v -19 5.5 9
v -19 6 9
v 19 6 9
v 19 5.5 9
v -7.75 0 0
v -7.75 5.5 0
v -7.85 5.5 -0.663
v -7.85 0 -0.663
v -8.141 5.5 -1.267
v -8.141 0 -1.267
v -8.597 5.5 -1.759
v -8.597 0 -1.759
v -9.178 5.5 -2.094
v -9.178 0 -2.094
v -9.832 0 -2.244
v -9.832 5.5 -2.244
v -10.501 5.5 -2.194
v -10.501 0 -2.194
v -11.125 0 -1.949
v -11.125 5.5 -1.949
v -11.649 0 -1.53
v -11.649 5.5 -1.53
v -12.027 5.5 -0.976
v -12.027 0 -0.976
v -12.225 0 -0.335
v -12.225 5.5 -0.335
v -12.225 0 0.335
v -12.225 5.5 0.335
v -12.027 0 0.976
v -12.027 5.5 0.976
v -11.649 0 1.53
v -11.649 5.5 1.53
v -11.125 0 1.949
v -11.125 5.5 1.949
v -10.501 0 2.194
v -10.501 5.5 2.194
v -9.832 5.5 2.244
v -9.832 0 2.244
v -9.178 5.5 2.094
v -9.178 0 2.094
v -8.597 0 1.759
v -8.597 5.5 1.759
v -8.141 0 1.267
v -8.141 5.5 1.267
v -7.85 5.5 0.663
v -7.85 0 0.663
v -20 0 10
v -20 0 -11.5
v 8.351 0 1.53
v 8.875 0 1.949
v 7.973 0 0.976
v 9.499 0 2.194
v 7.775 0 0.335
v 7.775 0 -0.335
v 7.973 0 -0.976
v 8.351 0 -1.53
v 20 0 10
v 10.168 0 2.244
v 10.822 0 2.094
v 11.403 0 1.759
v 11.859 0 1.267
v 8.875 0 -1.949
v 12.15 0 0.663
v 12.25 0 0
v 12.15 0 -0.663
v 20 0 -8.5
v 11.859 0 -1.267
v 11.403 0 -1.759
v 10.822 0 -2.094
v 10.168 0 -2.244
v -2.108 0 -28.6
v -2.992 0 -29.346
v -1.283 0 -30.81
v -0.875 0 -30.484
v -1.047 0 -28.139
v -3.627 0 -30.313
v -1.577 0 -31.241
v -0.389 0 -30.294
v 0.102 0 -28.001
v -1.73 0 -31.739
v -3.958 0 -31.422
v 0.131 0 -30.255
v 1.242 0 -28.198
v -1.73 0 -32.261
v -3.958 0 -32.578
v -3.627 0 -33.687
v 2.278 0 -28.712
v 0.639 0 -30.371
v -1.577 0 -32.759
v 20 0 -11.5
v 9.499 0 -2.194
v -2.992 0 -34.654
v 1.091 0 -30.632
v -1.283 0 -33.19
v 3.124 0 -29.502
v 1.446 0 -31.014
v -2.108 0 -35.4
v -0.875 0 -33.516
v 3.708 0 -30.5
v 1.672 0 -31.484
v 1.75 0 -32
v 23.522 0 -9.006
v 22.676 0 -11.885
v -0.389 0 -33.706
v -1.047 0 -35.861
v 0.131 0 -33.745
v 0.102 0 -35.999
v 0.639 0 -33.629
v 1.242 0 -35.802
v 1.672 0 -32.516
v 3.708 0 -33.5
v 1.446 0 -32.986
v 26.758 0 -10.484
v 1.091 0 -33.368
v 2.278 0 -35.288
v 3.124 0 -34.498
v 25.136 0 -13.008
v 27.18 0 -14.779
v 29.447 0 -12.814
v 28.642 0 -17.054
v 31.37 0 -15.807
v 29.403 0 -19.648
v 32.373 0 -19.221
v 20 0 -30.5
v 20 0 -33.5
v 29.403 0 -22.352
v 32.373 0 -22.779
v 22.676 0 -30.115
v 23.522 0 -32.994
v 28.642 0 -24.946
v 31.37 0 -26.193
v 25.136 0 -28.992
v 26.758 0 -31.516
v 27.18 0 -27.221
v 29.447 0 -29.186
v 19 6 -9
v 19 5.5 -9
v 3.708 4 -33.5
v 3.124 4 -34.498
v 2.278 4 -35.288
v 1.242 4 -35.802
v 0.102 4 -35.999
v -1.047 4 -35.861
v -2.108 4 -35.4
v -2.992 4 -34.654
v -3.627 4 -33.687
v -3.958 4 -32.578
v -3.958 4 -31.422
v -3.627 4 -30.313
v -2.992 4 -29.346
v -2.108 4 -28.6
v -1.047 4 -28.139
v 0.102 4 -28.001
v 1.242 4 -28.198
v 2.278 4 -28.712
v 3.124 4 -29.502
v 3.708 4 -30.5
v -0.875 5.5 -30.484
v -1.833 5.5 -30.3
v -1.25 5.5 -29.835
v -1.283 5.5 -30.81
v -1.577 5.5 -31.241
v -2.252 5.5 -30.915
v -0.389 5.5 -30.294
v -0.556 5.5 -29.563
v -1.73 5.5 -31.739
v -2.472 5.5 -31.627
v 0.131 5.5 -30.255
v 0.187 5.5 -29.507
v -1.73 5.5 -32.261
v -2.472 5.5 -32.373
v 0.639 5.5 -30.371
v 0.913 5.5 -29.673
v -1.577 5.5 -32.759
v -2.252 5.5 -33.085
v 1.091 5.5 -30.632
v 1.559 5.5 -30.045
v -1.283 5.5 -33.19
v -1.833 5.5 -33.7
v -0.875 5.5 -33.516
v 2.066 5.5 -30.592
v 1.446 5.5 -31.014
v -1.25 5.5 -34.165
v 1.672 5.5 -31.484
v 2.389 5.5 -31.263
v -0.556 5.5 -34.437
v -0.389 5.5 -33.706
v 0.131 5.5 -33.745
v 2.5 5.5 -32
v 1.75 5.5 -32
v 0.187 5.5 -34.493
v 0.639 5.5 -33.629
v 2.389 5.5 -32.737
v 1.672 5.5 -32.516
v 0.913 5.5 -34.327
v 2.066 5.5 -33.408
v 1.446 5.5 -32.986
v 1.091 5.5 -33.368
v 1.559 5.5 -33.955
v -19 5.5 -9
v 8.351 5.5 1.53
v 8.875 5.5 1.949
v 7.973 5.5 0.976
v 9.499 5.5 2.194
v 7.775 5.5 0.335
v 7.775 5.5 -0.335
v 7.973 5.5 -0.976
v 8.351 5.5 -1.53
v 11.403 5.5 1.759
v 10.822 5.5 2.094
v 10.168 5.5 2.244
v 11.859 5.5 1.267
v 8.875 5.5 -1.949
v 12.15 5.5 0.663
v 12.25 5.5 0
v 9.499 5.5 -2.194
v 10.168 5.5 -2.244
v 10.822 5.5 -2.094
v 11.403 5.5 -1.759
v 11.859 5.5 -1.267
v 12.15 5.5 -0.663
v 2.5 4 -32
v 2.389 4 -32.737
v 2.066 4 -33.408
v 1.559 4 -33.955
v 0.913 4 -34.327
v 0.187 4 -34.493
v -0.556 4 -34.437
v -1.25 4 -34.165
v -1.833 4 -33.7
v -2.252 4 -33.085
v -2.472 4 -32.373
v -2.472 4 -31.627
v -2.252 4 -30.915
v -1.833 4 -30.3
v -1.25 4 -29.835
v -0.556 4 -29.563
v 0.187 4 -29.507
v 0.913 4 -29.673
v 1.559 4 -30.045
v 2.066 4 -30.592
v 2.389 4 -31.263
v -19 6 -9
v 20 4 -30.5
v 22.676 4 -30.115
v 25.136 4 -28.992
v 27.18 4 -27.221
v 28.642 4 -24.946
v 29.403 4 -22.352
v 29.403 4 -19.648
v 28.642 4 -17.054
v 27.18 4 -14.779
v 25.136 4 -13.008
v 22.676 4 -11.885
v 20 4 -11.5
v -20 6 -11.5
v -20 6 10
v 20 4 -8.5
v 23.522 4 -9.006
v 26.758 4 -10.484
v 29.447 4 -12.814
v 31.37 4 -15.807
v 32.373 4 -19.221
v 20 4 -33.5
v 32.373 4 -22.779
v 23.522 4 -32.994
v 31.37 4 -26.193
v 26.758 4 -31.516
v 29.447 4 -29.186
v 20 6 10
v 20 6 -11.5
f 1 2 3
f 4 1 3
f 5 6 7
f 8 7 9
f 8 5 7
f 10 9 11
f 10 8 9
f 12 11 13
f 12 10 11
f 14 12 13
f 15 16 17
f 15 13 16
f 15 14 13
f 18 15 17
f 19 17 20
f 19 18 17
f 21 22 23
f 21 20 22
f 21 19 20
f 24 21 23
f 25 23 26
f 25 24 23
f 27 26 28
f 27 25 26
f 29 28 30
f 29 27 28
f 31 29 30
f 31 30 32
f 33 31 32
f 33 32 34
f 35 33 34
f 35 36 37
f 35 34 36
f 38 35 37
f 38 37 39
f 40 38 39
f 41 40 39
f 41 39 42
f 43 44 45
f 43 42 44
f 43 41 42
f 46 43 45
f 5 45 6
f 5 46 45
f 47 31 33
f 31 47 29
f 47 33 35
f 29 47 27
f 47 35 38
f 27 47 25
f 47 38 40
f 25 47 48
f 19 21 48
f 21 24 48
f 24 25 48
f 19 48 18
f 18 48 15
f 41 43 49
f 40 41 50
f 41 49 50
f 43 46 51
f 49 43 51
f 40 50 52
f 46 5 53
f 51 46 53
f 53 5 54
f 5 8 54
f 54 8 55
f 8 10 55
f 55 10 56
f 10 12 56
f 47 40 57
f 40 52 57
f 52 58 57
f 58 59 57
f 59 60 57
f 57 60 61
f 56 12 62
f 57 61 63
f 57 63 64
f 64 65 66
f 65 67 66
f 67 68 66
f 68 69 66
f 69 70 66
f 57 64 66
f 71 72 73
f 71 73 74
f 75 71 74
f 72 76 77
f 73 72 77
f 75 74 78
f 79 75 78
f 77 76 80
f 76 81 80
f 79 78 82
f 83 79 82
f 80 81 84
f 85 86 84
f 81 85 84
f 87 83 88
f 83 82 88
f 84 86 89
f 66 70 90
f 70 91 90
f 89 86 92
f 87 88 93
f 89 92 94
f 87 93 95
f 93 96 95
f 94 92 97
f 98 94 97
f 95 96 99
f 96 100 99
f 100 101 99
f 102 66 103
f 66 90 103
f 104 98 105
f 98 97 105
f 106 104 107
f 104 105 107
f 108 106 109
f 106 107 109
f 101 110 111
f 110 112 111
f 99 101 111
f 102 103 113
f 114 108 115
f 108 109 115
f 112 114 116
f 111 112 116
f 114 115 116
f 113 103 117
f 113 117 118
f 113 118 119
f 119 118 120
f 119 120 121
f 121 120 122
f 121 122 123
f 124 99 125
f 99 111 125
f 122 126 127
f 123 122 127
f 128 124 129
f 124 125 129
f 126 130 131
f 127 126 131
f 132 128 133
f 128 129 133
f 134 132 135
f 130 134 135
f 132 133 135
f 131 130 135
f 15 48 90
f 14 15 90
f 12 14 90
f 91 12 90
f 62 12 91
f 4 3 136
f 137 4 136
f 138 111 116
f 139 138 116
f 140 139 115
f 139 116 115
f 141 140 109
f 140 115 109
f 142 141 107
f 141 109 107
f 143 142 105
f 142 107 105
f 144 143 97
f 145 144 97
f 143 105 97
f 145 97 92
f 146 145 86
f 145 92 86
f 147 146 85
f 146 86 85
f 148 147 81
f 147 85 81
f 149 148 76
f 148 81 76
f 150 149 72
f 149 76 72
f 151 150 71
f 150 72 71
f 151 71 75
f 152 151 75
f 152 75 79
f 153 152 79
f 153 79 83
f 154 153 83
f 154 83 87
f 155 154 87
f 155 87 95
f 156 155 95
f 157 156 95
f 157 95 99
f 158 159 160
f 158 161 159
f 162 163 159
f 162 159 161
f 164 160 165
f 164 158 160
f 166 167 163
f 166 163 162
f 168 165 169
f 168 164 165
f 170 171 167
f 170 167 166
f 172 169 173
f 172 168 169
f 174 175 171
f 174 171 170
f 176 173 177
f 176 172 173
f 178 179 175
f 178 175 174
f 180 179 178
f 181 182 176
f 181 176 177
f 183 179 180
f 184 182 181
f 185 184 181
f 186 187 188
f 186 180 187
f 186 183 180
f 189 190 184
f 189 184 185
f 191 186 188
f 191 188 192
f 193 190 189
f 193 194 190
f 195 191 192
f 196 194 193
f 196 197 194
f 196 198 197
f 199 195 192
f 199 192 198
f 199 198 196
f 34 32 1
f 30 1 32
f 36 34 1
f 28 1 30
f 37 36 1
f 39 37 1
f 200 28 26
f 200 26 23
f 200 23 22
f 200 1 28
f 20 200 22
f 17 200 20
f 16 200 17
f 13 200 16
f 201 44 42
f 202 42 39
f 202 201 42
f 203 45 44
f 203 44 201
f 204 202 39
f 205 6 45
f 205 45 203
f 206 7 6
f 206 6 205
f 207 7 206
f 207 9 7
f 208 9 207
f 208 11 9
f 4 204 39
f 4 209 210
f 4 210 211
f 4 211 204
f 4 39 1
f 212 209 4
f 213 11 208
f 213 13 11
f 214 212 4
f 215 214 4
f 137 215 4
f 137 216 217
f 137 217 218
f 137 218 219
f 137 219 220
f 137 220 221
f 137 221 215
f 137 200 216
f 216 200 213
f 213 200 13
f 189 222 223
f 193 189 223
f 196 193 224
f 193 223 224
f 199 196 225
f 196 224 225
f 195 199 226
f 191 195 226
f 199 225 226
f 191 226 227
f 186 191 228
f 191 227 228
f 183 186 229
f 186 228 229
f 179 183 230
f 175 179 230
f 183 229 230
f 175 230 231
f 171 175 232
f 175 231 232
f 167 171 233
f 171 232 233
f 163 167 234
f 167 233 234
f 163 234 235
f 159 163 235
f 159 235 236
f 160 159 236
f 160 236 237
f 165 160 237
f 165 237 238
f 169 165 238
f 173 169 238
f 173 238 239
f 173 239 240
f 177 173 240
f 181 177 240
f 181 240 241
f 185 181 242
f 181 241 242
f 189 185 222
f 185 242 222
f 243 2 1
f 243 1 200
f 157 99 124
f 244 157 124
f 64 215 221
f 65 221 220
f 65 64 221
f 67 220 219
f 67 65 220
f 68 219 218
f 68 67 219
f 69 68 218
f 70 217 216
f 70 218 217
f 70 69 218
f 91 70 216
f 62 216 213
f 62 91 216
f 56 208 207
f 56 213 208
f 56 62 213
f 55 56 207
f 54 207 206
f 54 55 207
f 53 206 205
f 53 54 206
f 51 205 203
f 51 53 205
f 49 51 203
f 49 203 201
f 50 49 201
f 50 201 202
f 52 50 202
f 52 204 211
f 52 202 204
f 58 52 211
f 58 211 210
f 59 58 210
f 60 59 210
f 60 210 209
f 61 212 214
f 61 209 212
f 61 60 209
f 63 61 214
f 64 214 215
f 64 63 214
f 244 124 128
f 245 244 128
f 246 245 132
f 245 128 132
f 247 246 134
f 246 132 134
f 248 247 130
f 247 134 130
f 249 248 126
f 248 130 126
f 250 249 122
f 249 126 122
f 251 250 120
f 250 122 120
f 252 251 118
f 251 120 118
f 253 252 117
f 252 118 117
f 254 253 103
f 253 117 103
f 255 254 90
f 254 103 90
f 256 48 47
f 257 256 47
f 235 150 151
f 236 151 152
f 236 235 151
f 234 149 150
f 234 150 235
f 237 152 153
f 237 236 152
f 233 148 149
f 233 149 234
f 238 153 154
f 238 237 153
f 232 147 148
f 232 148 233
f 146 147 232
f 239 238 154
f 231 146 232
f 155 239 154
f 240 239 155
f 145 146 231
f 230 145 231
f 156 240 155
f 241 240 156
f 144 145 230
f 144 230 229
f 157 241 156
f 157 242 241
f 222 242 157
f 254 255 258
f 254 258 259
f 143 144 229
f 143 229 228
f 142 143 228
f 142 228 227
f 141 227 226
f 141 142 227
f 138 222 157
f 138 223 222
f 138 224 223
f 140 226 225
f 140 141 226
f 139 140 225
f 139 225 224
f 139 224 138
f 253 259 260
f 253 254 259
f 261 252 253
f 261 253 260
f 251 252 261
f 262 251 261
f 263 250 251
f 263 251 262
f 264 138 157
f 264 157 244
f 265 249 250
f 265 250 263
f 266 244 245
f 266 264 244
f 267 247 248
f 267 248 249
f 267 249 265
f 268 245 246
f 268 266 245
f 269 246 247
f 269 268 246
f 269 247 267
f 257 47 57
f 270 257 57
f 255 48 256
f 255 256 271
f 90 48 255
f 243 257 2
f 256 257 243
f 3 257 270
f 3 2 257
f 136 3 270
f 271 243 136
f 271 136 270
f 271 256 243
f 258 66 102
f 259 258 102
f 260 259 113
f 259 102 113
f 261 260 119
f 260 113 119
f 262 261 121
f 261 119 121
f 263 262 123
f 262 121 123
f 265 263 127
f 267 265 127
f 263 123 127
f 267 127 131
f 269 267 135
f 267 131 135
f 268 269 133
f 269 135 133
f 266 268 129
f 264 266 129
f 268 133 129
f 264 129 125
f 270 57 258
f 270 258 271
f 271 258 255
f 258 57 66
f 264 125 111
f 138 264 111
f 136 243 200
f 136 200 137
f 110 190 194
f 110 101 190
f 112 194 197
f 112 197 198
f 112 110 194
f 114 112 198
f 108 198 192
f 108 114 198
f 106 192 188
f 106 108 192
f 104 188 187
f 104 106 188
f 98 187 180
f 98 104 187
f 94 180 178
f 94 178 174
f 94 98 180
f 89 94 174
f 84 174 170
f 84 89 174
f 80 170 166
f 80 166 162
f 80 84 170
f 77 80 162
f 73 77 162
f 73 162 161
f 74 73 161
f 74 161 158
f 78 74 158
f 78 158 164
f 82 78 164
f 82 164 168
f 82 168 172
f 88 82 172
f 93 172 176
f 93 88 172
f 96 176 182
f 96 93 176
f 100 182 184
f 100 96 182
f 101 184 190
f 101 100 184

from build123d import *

# Parameters (mm, degrees)
SKETCH1_W           = 40
SKETCH1_H           = 21.5
SKETCH1_R           = 2.25
BOSS_EXTRUDE3_DEPTH = 6
SKETCH1_5_R         = 1.75
BOSS_EXTRUDE4_DEPTH = 4
SKETCH2_R           = 2.5
SKETCH2_R_2         = 1.75
BOSS_EXTRUDE5_DEPTH = 1.5
SKETCH3_W           = 38
SKETCH3_H           = 18
CUT_EXTRUDE1_DEPTH  = 0.5


with BuildPart() as part:
    # Sketch1 → Boss-Extrude3 (new body)
    with BuildSketch(Plane(origin=(0, 0, 0), x_dir=(1, 0, 0), z_dir=(0, 1, 0))):
        with Locations((0, 0.75)):
            Rectangle(SKETCH1_W, SKETCH1_H)
        with Locations((10, 0)):
            Circle(SKETCH1_R, mode=Mode.SUBTRACT)
        with Locations((-10, 0)):
            Circle(SKETCH1_R, mode=Mode.SUBTRACT)
    extrude(amount=BOSS_EXTRUDE3_DEPTH)

    # Sketch1<5> → Boss-Extrude4 (add)
    with BuildSketch(Plane(origin=(0, 0, 0), x_dir=(1, 0, 0), z_dir=(0, 1, 0))):
        with BuildLine():
            Line((20, 11.5), (20, 10))
            Line((20, 10), (20, 8.5))
            ThreePointArc((20, 8.5), (32.5, 21), (20, 33.5))
            Line((20, 33.5), (3.708099244, 33.5))
            ThreePointArc((3.708099244, 33.5), (-4, 32), (3.708099244, 30.5))
            Line((3.708099244, 30.5), (20, 30.5))
            ThreePointArc((20, 30.5), (29.5, 21), (20, 11.5))
        make_face()
        with Locations((0, 32)):
            Circle(SKETCH1_5_R, mode=Mode.SUBTRACT)
    extrude(amount=BOSS_EXTRUDE4_DEPTH)

    # Sketch2 → Boss-Extrude5 (add)
    with BuildSketch(Plane(origin=(0, 4, 0), x_dir=(1, 0, 0), z_dir=(0, 1, 0))):
        with Locations((0, 32)):
            Circle(SKETCH2_R)
        with Locations((0, 32)):
            Circle(SKETCH2_R_2, mode=Mode.SUBTRACT)
    extrude(amount=BOSS_EXTRUDE5_DEPTH)

    # Sketch3 → Cut-Extrude1 (cut)
    with BuildSketch(Plane(origin=(0, 6, 0), x_dir=(1, 0, 0), z_dir=(0, 1, 0))):
        Rectangle(SKETCH3_W, SKETCH3_H)
    extrude(amount=-CUT_EXTRUDE1_DEPTH, mode=Mode.SUBTRACT)


solid = part.part
